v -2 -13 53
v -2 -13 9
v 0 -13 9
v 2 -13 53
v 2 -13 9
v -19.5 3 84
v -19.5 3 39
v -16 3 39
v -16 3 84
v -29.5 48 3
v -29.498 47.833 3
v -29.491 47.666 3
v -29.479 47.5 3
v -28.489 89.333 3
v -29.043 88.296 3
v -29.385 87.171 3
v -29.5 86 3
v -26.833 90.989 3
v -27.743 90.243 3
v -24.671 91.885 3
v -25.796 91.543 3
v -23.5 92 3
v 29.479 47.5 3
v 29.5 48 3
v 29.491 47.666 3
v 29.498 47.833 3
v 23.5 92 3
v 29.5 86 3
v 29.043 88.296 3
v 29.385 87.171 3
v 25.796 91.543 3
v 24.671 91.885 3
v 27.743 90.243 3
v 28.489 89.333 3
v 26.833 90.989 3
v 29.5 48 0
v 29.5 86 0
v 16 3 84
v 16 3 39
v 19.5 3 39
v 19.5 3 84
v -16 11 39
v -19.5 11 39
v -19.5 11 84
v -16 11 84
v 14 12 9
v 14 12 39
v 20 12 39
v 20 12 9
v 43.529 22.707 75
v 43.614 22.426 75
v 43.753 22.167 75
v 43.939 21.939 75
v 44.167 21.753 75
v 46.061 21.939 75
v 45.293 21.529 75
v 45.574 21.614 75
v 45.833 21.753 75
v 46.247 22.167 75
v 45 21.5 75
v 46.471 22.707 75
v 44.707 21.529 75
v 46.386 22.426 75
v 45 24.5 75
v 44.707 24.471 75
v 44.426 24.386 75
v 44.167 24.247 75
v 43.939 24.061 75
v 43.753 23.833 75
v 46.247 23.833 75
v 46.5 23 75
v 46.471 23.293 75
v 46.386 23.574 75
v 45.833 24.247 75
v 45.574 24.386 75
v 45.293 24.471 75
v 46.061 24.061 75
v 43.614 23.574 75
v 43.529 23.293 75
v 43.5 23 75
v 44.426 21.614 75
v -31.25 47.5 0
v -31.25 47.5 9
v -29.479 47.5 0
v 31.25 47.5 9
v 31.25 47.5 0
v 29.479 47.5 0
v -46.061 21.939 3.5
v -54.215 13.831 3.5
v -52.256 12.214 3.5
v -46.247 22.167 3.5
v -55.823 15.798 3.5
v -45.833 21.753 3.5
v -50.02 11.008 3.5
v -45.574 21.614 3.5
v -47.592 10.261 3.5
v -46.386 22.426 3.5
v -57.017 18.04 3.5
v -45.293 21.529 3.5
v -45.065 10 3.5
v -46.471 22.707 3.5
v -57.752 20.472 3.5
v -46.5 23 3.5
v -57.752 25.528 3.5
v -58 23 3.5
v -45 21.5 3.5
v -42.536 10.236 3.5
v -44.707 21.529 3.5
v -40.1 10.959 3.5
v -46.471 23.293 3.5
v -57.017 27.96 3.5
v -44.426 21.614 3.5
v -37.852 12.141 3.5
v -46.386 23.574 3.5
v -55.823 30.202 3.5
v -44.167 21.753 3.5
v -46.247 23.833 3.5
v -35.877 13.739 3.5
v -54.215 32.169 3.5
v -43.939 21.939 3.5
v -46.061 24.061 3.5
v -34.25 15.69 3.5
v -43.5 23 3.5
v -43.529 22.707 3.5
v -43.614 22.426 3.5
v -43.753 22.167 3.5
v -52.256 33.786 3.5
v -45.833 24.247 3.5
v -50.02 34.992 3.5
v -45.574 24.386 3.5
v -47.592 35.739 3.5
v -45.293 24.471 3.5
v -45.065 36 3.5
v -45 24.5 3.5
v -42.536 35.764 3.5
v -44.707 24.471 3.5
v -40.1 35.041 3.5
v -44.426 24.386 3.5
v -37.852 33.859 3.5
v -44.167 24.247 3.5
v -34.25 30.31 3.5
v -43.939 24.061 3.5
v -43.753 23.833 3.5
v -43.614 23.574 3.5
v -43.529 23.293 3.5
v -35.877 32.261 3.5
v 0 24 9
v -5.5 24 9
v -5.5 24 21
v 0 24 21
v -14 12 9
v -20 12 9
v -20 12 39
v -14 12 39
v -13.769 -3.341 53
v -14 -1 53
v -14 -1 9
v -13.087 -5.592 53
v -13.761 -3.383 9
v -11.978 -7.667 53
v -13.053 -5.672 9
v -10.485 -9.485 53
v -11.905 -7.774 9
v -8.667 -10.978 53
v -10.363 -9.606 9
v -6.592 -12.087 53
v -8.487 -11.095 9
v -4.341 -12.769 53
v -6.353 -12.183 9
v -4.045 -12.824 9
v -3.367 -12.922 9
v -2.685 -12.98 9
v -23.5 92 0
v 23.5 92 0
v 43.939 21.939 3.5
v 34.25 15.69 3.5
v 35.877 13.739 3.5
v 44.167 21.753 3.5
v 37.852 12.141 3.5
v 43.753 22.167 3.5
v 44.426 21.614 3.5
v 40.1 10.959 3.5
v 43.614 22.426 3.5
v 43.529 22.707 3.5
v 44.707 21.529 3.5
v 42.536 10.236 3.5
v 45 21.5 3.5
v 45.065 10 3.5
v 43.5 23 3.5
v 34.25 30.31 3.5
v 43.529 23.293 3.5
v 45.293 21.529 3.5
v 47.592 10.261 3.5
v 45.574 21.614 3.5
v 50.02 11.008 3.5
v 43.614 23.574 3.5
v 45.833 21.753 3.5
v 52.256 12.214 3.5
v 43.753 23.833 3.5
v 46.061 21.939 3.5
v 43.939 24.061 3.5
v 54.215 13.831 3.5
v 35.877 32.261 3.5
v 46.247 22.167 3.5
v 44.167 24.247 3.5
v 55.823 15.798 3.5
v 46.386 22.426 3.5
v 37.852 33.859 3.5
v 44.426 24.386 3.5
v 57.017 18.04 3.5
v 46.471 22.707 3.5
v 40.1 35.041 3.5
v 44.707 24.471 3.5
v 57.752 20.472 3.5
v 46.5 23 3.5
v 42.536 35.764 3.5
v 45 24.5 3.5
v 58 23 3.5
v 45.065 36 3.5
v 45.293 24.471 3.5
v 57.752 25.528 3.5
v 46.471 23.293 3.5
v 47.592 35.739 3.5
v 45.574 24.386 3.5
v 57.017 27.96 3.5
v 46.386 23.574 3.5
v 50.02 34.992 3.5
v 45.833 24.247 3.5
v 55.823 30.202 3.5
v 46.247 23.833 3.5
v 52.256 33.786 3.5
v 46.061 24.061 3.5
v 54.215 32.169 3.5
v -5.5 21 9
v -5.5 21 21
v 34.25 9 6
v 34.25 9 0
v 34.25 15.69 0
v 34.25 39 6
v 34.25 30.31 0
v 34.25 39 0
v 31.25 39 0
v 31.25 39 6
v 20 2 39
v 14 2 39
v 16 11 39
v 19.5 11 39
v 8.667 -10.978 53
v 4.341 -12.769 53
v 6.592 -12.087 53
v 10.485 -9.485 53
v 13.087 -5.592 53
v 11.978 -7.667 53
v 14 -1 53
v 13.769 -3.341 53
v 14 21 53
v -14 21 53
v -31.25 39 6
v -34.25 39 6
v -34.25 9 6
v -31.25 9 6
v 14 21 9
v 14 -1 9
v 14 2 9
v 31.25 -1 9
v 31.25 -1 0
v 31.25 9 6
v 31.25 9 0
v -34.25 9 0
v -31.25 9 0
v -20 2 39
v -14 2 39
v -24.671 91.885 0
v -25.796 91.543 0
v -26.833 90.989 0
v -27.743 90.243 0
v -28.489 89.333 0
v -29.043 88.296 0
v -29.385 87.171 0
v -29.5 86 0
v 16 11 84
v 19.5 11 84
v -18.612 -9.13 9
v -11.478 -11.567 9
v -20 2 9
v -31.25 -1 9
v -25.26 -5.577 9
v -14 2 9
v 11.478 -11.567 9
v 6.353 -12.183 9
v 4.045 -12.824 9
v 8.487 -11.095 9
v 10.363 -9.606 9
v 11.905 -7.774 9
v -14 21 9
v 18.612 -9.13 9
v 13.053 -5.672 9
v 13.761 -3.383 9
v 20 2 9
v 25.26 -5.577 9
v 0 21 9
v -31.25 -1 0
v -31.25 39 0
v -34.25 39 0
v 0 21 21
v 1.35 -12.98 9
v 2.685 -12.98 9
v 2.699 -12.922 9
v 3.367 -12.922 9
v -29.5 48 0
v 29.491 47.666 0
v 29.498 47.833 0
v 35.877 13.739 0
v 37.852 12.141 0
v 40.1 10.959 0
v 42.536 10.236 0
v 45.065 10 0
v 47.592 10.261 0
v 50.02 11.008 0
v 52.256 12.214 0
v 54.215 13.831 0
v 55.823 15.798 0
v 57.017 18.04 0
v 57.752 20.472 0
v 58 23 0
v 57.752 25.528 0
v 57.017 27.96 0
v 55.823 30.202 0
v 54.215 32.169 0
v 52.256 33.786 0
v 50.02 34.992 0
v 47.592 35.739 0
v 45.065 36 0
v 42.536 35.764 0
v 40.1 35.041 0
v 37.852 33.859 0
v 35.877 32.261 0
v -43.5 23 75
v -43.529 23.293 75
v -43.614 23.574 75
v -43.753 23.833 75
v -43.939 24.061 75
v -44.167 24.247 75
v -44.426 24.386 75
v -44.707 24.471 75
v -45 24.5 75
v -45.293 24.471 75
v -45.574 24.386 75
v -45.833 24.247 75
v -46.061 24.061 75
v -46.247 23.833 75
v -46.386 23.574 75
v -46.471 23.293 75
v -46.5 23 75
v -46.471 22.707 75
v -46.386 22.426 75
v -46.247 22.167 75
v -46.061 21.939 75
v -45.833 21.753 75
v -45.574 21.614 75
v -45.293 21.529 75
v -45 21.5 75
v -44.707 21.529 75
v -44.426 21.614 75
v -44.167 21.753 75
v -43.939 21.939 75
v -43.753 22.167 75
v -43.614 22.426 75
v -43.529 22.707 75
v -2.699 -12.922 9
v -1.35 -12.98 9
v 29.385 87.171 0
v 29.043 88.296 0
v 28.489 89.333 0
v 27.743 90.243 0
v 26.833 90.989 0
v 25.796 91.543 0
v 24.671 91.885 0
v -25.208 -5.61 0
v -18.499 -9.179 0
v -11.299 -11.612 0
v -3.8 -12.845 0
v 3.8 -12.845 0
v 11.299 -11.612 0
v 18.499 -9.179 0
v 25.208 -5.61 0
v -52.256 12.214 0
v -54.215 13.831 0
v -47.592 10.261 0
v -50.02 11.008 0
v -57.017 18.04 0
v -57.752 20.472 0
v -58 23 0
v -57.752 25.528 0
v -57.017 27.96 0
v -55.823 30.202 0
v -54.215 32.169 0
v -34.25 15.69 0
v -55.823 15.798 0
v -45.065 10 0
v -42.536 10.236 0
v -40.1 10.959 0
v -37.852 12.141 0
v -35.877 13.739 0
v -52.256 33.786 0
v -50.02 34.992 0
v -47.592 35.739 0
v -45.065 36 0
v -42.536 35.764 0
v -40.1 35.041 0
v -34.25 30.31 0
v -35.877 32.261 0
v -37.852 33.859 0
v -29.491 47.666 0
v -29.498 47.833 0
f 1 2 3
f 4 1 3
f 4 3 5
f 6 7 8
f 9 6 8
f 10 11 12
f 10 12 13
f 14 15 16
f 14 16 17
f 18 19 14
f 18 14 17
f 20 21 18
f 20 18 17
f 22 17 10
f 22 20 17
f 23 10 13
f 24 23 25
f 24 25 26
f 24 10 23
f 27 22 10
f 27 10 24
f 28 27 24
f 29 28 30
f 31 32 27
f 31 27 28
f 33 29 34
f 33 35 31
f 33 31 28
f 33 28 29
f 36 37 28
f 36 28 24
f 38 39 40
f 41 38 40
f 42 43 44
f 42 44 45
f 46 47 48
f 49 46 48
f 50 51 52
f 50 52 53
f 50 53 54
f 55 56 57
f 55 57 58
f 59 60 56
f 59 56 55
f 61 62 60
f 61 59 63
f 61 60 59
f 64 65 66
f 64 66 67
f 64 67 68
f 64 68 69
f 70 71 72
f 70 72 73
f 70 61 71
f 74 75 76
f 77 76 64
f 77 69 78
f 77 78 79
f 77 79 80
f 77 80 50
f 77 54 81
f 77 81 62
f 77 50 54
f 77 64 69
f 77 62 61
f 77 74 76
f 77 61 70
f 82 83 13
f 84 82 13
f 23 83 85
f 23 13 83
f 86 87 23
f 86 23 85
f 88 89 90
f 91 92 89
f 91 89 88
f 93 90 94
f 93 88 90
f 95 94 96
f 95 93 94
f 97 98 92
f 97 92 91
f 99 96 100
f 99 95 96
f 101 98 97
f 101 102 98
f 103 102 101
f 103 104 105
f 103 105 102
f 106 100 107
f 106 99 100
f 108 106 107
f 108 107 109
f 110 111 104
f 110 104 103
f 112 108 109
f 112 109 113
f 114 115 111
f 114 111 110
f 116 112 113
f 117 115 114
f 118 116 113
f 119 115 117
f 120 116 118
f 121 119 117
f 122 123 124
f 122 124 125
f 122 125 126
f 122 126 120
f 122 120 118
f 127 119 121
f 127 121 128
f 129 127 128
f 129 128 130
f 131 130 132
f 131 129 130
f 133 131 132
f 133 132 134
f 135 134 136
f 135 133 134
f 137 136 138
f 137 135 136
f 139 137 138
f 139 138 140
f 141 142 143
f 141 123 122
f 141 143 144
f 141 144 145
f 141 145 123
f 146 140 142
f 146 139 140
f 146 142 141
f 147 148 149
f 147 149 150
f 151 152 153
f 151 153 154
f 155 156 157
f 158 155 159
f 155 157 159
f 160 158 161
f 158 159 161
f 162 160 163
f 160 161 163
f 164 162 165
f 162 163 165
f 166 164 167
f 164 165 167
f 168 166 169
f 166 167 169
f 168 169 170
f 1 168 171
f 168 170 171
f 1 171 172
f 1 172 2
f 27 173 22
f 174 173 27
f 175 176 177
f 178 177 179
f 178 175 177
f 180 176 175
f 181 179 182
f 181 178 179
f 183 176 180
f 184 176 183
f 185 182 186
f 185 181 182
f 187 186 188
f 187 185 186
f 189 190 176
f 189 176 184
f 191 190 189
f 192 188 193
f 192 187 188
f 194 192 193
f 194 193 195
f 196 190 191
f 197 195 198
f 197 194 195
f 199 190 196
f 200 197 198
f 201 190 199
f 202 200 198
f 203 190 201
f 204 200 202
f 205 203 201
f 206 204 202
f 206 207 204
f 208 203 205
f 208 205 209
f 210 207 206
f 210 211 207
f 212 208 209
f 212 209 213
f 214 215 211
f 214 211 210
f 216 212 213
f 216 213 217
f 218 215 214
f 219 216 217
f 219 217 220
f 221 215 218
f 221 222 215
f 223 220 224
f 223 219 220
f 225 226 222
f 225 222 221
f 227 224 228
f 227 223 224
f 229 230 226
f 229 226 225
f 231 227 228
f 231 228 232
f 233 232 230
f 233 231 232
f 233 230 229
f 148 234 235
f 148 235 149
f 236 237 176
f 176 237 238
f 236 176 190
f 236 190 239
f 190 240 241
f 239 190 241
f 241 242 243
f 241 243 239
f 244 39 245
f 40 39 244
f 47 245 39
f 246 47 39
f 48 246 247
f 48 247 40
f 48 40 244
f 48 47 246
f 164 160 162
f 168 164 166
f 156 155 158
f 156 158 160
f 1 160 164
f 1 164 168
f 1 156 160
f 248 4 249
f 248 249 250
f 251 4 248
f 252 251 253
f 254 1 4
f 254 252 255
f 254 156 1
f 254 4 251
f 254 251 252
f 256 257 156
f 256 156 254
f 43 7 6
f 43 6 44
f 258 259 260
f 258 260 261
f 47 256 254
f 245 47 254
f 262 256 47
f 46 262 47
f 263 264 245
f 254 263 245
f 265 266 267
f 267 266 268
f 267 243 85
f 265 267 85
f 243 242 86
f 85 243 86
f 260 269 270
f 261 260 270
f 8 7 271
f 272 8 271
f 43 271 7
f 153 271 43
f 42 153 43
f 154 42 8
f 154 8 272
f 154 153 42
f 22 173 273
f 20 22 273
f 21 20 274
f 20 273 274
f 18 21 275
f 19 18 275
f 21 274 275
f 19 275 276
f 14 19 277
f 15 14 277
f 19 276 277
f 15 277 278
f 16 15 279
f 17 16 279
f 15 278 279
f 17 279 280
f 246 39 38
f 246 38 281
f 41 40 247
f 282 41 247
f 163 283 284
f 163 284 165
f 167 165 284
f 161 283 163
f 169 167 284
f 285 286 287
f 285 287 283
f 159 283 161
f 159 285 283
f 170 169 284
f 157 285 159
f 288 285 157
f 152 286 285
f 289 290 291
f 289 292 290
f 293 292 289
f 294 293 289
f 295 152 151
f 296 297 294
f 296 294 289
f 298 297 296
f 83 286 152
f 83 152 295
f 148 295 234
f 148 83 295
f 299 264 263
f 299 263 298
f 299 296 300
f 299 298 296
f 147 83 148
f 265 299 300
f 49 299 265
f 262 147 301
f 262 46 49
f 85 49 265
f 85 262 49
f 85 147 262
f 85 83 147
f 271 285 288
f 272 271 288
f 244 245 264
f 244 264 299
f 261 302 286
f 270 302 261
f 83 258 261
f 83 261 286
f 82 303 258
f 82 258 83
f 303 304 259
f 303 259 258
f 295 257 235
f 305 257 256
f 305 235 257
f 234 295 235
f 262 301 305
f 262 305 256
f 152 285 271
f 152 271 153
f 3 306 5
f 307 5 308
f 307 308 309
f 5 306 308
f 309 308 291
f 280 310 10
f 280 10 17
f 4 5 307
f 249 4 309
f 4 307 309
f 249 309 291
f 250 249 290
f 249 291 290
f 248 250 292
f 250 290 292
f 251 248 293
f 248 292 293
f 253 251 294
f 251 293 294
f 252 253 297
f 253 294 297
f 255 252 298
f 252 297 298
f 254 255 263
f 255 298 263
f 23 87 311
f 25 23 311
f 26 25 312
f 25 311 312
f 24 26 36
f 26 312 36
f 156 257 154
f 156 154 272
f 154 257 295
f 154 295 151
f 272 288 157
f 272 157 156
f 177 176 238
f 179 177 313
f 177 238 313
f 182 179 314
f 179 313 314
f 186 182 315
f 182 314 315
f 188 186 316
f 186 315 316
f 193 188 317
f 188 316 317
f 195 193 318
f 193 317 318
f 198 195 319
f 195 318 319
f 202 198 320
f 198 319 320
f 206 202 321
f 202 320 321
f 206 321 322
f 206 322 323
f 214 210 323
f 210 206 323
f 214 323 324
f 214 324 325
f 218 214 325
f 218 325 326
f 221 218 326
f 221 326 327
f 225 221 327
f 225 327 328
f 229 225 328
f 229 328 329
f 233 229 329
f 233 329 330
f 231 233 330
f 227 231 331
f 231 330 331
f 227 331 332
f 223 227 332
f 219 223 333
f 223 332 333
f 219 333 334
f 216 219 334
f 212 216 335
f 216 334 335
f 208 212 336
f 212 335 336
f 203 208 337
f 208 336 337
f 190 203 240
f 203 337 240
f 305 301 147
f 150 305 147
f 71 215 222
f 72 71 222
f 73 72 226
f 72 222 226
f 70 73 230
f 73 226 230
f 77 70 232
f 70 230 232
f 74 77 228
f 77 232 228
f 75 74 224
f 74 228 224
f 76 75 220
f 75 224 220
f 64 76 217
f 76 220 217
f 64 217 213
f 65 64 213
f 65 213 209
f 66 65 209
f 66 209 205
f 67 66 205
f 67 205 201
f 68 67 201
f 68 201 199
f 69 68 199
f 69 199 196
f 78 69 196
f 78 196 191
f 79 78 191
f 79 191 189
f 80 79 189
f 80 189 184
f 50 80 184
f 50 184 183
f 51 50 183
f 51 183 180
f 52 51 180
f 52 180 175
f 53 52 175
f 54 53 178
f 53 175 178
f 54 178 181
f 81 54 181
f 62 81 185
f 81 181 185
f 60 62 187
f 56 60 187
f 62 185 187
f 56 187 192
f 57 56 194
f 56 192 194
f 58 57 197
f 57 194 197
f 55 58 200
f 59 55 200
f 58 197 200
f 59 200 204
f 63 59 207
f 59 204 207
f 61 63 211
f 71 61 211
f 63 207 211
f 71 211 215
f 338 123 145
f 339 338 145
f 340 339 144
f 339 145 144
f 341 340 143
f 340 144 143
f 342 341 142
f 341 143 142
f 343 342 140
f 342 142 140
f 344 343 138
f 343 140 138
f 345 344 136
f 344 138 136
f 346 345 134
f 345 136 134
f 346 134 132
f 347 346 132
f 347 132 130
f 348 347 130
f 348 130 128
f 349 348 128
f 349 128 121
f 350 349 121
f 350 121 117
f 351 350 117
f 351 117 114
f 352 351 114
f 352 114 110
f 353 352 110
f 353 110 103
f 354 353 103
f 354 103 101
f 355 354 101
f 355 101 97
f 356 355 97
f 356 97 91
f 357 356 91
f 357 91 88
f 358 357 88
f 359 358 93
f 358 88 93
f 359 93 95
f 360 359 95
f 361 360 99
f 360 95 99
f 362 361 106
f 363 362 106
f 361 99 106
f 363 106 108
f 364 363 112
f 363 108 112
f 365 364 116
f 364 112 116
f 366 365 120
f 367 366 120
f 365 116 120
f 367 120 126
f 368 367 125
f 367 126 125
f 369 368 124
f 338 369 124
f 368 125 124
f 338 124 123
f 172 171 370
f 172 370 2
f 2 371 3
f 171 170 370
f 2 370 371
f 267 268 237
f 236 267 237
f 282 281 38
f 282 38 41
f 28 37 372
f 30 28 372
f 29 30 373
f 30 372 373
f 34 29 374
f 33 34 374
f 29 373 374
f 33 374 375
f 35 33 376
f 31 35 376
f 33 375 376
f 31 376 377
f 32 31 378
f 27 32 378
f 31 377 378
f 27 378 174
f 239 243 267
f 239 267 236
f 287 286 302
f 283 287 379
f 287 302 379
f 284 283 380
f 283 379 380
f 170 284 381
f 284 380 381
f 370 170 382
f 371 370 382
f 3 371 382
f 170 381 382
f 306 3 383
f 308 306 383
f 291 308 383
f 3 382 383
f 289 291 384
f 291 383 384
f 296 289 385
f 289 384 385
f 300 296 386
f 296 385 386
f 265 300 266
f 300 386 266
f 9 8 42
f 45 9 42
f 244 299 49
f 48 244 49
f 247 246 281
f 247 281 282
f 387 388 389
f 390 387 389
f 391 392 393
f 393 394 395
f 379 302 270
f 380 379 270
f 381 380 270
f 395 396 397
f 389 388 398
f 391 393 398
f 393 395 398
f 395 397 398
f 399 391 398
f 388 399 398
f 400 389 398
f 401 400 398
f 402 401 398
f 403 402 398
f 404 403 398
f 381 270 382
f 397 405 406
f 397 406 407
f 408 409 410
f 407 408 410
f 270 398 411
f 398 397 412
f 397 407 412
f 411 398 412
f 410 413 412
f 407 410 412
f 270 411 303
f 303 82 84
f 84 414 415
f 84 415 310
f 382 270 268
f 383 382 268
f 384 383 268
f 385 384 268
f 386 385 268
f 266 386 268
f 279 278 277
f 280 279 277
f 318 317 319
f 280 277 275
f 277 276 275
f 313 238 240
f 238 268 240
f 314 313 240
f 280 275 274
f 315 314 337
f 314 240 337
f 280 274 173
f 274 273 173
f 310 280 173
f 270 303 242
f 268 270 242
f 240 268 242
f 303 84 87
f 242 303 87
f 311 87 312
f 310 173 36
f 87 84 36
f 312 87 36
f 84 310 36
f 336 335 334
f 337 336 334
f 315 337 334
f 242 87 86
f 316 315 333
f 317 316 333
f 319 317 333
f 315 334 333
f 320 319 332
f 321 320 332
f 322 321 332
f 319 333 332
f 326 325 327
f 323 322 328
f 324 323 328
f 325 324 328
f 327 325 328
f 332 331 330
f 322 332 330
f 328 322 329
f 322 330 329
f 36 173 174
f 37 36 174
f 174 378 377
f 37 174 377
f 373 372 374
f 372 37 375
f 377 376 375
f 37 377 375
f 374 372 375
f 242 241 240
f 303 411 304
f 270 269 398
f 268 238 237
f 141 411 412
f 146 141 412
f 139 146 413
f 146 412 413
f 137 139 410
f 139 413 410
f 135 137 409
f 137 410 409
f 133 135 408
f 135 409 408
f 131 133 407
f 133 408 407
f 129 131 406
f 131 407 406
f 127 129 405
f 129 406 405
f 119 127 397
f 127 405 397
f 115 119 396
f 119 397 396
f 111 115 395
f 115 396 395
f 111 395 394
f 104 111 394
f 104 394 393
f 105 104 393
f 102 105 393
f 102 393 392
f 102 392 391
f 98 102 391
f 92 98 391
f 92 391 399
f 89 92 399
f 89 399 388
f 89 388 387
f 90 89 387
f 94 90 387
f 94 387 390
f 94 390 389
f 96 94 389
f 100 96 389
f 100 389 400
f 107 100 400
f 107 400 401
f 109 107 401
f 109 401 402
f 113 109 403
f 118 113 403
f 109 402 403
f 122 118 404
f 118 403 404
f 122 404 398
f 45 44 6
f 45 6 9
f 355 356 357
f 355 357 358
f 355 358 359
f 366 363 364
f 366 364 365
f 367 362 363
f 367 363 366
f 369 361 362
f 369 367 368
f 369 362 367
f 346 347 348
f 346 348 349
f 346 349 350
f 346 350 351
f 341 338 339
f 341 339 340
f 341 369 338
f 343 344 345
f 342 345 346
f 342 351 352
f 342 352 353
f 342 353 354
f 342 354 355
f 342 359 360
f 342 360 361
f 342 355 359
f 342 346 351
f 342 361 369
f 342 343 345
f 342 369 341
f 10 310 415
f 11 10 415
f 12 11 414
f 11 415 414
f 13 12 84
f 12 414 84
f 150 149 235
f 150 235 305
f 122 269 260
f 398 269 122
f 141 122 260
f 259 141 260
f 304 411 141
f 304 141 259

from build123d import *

# Parameters (mm, degrees)
SKETCH007_R      = 1.5
EXTRUDE012_DEPTH = 75
SKETCH008_R      = 13
EXTRUDE014_DEPTH = 3.5
EXTRUDE002_DEPTH = 44
SKETCH002_W      = 3.5
SKETCH002_H      = 8
EXTRUDE003_DEPTH = 75
SKETCH003_W      = 40
SKETCH003_H      = 10
EXTRUDE005_DEPTH = 30
SKETCH004_W      = 68.5
SKETCH004_H      = 30
EXTRUDE006_DEPTH = 6
SKETCH005_W      = 5.5
SKETCH005_H      = 24
EXTRUDE008_DEPTH = 12
EXTRUDE009_DEPTH = 3
EXTRUDE010_DEPTH = 3
EXTRUDE_DEPTH    = 9


with BuildPart() as extrude012:
    # Sketch007 → Extrude012 (new body)
    with BuildSketch(Plane.XY):
        with Locations((-45, 23)):
            Circle(SKETCH007_R)
        with Locations((45, 23)):
            Circle(SKETCH007_R)
    extrude(amount=EXTRUDE012_DEPTH)


with BuildPart() as extrude014:
    # Sketch008 → Extrude014 (new body)
    with BuildSketch(Plane.XY):
        with Locations((-45, 23)):
            Circle(SKETCH008_R)
        with Locations((45, 23)):
            Circle(SKETCH008_R)
    extrude(amount=EXTRUDE014_DEPTH)


with BuildPart() as extrude002:
    # Sketch001 (on Face6 of Extrude) → Extrude002 (new body)
    with BuildSketch(Plane.XY.offset(9)):
        with BuildLine():
            Line((-14, 21), (-14, -1))
            ThreePointArc((-14, -1), (-10.485281, -9.485281), (-2, -13))
            Line((-2, -13), (2, -13))
            ThreePointArc((2, -13), (10.485281, -9.485281), (14, -1))
            Line((14, 21), (14, -1))
            Line((-14, 21), (14, 21))
        make_face()
    extrude(amount=EXTRUDE002_DEPTH)


with BuildPart() as extrude003:
    # Sketch002 (on Face6 of Extrude) → Extrude003 (new body)
    with BuildSketch(Plane.XY.offset(9)):
        with Locations((-17.75, 7)):
            Rectangle(SKETCH002_W, SKETCH002_H)
        with Locations((17.75, 7)):
            Rectangle(SKETCH002_W, SKETCH002_H)
    extrude(amount=EXTRUDE003_DEPTH)


with BuildPart() as extrude005:
    # Sketch003 (on Face6 of Extrude) → Extrude005 (new body)
    with BuildSketch(Plane.XY.offset(9)):
        with Locations((0, 7)):
            Rectangle(SKETCH003_W, SKETCH003_H)
    extrude(amount=EXTRUDE005_DEPTH)


with BuildPart() as extrude006:
    # Sketch004 → Extrude006 (new body)
    with BuildSketch(Plane.XY):
        with Locations((0, 24)):
            Rectangle(SKETCH004_W, SKETCH004_H)
    extrude(amount=EXTRUDE006_DEPTH)


with BuildPart() as extrude008:
    # Sketch005 (on Face6 of Extrude) → Extrude008 (new body)
    with BuildSketch(Plane.XY.offset(9)):
        with Locations((-2.75, 12)):
            Rectangle(SKETCH005_W, SKETCH005_H)
    extrude(amount=EXTRUDE008_DEPTH)


with BuildPart() as extrude009:
    # Sketch006 → Extrude009 (new body)
    with BuildSketch(Plane.XY):
        with BuildLine():
            ThreePointArc((-23.5, 92), (-27.742641, 90.242641), (-29.5, 86))
            Line((-29.5, 48), (-29.5, 86))
            ThreePointArc((-29.5, 48), (-27.742641, 43.757359), (-23.5, 42))
            Line((23.5, 42), (-23.5, 42))
            ThreePointArc((23.5, 42), (27.742641, 43.757359), (29.5, 48))
            Line((29.5, 86), (29.5, 48))
            ThreePointArc((29.5, 86), (27.742641, 90.242641), (23.5, 92))
            Line((-23.5, 92), (23.5, 92))
        make_face()
    extrude(amount=EXTRUDE009_DEPTH)


with BuildPart() as extrude010:
    # Sketch006 → Extrude010 (new body)
    with BuildSketch(Plane.XY):
        with BuildLine():
            ThreePointArc((-23.5, 92), (-27.742641, 90.242641), (-29.5, 86))
            Line((-29.5, 48), (-29.5, 86))
            ThreePointArc((-29.5, 48), (-27.742641, 43.757359), (-23.5, 42))
            Line((23.5, 42), (-23.5, 42))
            ThreePointArc((23.5, 42), (27.742641, 43.757359), (29.5, 48))
            Line((29.5, 86), (29.5, 48))
            ThreePointArc((29.5, 86), (27.742641, 90.242641), (23.5, 92))
            Line((-23.5, 92), (23.5, 92))
        make_face()
    extrude(amount=EXTRUDE010_DEPTH)


with BuildPart() as fusion001:
    # Sketch → Extrude (new body)
    with BuildSketch(Plane.XY):
        with BuildLine():
            ThreePointArc((-31.25, -1), (0, -13), (31.25, -1))
            Line((31.25, -1), (31.25, 47.5))
            Line((-31.25, 47.5), (31.25, 47.5))
            Line((-31.25, -1), (-31.25, 47.5))
        make_face()
    extrude(amount=EXTRUDE_DEPTH)

    # Fusion: union Extrude002, Extrude003, Extrude005, Extrude006, Extrude008, Extrude009, Extrude010
    add(extrude002.part)
    add(extrude003.part)
    add(extrude005.part)
    add(extrude006.part)
    add(extrude008.part)
    add(extrude009.part)
    add(extrude010.part)

    # Fusion001: union Extrude012, Extrude014
    add(extrude012.part)
    add(extrude014.part)


solid = fusion001.part
